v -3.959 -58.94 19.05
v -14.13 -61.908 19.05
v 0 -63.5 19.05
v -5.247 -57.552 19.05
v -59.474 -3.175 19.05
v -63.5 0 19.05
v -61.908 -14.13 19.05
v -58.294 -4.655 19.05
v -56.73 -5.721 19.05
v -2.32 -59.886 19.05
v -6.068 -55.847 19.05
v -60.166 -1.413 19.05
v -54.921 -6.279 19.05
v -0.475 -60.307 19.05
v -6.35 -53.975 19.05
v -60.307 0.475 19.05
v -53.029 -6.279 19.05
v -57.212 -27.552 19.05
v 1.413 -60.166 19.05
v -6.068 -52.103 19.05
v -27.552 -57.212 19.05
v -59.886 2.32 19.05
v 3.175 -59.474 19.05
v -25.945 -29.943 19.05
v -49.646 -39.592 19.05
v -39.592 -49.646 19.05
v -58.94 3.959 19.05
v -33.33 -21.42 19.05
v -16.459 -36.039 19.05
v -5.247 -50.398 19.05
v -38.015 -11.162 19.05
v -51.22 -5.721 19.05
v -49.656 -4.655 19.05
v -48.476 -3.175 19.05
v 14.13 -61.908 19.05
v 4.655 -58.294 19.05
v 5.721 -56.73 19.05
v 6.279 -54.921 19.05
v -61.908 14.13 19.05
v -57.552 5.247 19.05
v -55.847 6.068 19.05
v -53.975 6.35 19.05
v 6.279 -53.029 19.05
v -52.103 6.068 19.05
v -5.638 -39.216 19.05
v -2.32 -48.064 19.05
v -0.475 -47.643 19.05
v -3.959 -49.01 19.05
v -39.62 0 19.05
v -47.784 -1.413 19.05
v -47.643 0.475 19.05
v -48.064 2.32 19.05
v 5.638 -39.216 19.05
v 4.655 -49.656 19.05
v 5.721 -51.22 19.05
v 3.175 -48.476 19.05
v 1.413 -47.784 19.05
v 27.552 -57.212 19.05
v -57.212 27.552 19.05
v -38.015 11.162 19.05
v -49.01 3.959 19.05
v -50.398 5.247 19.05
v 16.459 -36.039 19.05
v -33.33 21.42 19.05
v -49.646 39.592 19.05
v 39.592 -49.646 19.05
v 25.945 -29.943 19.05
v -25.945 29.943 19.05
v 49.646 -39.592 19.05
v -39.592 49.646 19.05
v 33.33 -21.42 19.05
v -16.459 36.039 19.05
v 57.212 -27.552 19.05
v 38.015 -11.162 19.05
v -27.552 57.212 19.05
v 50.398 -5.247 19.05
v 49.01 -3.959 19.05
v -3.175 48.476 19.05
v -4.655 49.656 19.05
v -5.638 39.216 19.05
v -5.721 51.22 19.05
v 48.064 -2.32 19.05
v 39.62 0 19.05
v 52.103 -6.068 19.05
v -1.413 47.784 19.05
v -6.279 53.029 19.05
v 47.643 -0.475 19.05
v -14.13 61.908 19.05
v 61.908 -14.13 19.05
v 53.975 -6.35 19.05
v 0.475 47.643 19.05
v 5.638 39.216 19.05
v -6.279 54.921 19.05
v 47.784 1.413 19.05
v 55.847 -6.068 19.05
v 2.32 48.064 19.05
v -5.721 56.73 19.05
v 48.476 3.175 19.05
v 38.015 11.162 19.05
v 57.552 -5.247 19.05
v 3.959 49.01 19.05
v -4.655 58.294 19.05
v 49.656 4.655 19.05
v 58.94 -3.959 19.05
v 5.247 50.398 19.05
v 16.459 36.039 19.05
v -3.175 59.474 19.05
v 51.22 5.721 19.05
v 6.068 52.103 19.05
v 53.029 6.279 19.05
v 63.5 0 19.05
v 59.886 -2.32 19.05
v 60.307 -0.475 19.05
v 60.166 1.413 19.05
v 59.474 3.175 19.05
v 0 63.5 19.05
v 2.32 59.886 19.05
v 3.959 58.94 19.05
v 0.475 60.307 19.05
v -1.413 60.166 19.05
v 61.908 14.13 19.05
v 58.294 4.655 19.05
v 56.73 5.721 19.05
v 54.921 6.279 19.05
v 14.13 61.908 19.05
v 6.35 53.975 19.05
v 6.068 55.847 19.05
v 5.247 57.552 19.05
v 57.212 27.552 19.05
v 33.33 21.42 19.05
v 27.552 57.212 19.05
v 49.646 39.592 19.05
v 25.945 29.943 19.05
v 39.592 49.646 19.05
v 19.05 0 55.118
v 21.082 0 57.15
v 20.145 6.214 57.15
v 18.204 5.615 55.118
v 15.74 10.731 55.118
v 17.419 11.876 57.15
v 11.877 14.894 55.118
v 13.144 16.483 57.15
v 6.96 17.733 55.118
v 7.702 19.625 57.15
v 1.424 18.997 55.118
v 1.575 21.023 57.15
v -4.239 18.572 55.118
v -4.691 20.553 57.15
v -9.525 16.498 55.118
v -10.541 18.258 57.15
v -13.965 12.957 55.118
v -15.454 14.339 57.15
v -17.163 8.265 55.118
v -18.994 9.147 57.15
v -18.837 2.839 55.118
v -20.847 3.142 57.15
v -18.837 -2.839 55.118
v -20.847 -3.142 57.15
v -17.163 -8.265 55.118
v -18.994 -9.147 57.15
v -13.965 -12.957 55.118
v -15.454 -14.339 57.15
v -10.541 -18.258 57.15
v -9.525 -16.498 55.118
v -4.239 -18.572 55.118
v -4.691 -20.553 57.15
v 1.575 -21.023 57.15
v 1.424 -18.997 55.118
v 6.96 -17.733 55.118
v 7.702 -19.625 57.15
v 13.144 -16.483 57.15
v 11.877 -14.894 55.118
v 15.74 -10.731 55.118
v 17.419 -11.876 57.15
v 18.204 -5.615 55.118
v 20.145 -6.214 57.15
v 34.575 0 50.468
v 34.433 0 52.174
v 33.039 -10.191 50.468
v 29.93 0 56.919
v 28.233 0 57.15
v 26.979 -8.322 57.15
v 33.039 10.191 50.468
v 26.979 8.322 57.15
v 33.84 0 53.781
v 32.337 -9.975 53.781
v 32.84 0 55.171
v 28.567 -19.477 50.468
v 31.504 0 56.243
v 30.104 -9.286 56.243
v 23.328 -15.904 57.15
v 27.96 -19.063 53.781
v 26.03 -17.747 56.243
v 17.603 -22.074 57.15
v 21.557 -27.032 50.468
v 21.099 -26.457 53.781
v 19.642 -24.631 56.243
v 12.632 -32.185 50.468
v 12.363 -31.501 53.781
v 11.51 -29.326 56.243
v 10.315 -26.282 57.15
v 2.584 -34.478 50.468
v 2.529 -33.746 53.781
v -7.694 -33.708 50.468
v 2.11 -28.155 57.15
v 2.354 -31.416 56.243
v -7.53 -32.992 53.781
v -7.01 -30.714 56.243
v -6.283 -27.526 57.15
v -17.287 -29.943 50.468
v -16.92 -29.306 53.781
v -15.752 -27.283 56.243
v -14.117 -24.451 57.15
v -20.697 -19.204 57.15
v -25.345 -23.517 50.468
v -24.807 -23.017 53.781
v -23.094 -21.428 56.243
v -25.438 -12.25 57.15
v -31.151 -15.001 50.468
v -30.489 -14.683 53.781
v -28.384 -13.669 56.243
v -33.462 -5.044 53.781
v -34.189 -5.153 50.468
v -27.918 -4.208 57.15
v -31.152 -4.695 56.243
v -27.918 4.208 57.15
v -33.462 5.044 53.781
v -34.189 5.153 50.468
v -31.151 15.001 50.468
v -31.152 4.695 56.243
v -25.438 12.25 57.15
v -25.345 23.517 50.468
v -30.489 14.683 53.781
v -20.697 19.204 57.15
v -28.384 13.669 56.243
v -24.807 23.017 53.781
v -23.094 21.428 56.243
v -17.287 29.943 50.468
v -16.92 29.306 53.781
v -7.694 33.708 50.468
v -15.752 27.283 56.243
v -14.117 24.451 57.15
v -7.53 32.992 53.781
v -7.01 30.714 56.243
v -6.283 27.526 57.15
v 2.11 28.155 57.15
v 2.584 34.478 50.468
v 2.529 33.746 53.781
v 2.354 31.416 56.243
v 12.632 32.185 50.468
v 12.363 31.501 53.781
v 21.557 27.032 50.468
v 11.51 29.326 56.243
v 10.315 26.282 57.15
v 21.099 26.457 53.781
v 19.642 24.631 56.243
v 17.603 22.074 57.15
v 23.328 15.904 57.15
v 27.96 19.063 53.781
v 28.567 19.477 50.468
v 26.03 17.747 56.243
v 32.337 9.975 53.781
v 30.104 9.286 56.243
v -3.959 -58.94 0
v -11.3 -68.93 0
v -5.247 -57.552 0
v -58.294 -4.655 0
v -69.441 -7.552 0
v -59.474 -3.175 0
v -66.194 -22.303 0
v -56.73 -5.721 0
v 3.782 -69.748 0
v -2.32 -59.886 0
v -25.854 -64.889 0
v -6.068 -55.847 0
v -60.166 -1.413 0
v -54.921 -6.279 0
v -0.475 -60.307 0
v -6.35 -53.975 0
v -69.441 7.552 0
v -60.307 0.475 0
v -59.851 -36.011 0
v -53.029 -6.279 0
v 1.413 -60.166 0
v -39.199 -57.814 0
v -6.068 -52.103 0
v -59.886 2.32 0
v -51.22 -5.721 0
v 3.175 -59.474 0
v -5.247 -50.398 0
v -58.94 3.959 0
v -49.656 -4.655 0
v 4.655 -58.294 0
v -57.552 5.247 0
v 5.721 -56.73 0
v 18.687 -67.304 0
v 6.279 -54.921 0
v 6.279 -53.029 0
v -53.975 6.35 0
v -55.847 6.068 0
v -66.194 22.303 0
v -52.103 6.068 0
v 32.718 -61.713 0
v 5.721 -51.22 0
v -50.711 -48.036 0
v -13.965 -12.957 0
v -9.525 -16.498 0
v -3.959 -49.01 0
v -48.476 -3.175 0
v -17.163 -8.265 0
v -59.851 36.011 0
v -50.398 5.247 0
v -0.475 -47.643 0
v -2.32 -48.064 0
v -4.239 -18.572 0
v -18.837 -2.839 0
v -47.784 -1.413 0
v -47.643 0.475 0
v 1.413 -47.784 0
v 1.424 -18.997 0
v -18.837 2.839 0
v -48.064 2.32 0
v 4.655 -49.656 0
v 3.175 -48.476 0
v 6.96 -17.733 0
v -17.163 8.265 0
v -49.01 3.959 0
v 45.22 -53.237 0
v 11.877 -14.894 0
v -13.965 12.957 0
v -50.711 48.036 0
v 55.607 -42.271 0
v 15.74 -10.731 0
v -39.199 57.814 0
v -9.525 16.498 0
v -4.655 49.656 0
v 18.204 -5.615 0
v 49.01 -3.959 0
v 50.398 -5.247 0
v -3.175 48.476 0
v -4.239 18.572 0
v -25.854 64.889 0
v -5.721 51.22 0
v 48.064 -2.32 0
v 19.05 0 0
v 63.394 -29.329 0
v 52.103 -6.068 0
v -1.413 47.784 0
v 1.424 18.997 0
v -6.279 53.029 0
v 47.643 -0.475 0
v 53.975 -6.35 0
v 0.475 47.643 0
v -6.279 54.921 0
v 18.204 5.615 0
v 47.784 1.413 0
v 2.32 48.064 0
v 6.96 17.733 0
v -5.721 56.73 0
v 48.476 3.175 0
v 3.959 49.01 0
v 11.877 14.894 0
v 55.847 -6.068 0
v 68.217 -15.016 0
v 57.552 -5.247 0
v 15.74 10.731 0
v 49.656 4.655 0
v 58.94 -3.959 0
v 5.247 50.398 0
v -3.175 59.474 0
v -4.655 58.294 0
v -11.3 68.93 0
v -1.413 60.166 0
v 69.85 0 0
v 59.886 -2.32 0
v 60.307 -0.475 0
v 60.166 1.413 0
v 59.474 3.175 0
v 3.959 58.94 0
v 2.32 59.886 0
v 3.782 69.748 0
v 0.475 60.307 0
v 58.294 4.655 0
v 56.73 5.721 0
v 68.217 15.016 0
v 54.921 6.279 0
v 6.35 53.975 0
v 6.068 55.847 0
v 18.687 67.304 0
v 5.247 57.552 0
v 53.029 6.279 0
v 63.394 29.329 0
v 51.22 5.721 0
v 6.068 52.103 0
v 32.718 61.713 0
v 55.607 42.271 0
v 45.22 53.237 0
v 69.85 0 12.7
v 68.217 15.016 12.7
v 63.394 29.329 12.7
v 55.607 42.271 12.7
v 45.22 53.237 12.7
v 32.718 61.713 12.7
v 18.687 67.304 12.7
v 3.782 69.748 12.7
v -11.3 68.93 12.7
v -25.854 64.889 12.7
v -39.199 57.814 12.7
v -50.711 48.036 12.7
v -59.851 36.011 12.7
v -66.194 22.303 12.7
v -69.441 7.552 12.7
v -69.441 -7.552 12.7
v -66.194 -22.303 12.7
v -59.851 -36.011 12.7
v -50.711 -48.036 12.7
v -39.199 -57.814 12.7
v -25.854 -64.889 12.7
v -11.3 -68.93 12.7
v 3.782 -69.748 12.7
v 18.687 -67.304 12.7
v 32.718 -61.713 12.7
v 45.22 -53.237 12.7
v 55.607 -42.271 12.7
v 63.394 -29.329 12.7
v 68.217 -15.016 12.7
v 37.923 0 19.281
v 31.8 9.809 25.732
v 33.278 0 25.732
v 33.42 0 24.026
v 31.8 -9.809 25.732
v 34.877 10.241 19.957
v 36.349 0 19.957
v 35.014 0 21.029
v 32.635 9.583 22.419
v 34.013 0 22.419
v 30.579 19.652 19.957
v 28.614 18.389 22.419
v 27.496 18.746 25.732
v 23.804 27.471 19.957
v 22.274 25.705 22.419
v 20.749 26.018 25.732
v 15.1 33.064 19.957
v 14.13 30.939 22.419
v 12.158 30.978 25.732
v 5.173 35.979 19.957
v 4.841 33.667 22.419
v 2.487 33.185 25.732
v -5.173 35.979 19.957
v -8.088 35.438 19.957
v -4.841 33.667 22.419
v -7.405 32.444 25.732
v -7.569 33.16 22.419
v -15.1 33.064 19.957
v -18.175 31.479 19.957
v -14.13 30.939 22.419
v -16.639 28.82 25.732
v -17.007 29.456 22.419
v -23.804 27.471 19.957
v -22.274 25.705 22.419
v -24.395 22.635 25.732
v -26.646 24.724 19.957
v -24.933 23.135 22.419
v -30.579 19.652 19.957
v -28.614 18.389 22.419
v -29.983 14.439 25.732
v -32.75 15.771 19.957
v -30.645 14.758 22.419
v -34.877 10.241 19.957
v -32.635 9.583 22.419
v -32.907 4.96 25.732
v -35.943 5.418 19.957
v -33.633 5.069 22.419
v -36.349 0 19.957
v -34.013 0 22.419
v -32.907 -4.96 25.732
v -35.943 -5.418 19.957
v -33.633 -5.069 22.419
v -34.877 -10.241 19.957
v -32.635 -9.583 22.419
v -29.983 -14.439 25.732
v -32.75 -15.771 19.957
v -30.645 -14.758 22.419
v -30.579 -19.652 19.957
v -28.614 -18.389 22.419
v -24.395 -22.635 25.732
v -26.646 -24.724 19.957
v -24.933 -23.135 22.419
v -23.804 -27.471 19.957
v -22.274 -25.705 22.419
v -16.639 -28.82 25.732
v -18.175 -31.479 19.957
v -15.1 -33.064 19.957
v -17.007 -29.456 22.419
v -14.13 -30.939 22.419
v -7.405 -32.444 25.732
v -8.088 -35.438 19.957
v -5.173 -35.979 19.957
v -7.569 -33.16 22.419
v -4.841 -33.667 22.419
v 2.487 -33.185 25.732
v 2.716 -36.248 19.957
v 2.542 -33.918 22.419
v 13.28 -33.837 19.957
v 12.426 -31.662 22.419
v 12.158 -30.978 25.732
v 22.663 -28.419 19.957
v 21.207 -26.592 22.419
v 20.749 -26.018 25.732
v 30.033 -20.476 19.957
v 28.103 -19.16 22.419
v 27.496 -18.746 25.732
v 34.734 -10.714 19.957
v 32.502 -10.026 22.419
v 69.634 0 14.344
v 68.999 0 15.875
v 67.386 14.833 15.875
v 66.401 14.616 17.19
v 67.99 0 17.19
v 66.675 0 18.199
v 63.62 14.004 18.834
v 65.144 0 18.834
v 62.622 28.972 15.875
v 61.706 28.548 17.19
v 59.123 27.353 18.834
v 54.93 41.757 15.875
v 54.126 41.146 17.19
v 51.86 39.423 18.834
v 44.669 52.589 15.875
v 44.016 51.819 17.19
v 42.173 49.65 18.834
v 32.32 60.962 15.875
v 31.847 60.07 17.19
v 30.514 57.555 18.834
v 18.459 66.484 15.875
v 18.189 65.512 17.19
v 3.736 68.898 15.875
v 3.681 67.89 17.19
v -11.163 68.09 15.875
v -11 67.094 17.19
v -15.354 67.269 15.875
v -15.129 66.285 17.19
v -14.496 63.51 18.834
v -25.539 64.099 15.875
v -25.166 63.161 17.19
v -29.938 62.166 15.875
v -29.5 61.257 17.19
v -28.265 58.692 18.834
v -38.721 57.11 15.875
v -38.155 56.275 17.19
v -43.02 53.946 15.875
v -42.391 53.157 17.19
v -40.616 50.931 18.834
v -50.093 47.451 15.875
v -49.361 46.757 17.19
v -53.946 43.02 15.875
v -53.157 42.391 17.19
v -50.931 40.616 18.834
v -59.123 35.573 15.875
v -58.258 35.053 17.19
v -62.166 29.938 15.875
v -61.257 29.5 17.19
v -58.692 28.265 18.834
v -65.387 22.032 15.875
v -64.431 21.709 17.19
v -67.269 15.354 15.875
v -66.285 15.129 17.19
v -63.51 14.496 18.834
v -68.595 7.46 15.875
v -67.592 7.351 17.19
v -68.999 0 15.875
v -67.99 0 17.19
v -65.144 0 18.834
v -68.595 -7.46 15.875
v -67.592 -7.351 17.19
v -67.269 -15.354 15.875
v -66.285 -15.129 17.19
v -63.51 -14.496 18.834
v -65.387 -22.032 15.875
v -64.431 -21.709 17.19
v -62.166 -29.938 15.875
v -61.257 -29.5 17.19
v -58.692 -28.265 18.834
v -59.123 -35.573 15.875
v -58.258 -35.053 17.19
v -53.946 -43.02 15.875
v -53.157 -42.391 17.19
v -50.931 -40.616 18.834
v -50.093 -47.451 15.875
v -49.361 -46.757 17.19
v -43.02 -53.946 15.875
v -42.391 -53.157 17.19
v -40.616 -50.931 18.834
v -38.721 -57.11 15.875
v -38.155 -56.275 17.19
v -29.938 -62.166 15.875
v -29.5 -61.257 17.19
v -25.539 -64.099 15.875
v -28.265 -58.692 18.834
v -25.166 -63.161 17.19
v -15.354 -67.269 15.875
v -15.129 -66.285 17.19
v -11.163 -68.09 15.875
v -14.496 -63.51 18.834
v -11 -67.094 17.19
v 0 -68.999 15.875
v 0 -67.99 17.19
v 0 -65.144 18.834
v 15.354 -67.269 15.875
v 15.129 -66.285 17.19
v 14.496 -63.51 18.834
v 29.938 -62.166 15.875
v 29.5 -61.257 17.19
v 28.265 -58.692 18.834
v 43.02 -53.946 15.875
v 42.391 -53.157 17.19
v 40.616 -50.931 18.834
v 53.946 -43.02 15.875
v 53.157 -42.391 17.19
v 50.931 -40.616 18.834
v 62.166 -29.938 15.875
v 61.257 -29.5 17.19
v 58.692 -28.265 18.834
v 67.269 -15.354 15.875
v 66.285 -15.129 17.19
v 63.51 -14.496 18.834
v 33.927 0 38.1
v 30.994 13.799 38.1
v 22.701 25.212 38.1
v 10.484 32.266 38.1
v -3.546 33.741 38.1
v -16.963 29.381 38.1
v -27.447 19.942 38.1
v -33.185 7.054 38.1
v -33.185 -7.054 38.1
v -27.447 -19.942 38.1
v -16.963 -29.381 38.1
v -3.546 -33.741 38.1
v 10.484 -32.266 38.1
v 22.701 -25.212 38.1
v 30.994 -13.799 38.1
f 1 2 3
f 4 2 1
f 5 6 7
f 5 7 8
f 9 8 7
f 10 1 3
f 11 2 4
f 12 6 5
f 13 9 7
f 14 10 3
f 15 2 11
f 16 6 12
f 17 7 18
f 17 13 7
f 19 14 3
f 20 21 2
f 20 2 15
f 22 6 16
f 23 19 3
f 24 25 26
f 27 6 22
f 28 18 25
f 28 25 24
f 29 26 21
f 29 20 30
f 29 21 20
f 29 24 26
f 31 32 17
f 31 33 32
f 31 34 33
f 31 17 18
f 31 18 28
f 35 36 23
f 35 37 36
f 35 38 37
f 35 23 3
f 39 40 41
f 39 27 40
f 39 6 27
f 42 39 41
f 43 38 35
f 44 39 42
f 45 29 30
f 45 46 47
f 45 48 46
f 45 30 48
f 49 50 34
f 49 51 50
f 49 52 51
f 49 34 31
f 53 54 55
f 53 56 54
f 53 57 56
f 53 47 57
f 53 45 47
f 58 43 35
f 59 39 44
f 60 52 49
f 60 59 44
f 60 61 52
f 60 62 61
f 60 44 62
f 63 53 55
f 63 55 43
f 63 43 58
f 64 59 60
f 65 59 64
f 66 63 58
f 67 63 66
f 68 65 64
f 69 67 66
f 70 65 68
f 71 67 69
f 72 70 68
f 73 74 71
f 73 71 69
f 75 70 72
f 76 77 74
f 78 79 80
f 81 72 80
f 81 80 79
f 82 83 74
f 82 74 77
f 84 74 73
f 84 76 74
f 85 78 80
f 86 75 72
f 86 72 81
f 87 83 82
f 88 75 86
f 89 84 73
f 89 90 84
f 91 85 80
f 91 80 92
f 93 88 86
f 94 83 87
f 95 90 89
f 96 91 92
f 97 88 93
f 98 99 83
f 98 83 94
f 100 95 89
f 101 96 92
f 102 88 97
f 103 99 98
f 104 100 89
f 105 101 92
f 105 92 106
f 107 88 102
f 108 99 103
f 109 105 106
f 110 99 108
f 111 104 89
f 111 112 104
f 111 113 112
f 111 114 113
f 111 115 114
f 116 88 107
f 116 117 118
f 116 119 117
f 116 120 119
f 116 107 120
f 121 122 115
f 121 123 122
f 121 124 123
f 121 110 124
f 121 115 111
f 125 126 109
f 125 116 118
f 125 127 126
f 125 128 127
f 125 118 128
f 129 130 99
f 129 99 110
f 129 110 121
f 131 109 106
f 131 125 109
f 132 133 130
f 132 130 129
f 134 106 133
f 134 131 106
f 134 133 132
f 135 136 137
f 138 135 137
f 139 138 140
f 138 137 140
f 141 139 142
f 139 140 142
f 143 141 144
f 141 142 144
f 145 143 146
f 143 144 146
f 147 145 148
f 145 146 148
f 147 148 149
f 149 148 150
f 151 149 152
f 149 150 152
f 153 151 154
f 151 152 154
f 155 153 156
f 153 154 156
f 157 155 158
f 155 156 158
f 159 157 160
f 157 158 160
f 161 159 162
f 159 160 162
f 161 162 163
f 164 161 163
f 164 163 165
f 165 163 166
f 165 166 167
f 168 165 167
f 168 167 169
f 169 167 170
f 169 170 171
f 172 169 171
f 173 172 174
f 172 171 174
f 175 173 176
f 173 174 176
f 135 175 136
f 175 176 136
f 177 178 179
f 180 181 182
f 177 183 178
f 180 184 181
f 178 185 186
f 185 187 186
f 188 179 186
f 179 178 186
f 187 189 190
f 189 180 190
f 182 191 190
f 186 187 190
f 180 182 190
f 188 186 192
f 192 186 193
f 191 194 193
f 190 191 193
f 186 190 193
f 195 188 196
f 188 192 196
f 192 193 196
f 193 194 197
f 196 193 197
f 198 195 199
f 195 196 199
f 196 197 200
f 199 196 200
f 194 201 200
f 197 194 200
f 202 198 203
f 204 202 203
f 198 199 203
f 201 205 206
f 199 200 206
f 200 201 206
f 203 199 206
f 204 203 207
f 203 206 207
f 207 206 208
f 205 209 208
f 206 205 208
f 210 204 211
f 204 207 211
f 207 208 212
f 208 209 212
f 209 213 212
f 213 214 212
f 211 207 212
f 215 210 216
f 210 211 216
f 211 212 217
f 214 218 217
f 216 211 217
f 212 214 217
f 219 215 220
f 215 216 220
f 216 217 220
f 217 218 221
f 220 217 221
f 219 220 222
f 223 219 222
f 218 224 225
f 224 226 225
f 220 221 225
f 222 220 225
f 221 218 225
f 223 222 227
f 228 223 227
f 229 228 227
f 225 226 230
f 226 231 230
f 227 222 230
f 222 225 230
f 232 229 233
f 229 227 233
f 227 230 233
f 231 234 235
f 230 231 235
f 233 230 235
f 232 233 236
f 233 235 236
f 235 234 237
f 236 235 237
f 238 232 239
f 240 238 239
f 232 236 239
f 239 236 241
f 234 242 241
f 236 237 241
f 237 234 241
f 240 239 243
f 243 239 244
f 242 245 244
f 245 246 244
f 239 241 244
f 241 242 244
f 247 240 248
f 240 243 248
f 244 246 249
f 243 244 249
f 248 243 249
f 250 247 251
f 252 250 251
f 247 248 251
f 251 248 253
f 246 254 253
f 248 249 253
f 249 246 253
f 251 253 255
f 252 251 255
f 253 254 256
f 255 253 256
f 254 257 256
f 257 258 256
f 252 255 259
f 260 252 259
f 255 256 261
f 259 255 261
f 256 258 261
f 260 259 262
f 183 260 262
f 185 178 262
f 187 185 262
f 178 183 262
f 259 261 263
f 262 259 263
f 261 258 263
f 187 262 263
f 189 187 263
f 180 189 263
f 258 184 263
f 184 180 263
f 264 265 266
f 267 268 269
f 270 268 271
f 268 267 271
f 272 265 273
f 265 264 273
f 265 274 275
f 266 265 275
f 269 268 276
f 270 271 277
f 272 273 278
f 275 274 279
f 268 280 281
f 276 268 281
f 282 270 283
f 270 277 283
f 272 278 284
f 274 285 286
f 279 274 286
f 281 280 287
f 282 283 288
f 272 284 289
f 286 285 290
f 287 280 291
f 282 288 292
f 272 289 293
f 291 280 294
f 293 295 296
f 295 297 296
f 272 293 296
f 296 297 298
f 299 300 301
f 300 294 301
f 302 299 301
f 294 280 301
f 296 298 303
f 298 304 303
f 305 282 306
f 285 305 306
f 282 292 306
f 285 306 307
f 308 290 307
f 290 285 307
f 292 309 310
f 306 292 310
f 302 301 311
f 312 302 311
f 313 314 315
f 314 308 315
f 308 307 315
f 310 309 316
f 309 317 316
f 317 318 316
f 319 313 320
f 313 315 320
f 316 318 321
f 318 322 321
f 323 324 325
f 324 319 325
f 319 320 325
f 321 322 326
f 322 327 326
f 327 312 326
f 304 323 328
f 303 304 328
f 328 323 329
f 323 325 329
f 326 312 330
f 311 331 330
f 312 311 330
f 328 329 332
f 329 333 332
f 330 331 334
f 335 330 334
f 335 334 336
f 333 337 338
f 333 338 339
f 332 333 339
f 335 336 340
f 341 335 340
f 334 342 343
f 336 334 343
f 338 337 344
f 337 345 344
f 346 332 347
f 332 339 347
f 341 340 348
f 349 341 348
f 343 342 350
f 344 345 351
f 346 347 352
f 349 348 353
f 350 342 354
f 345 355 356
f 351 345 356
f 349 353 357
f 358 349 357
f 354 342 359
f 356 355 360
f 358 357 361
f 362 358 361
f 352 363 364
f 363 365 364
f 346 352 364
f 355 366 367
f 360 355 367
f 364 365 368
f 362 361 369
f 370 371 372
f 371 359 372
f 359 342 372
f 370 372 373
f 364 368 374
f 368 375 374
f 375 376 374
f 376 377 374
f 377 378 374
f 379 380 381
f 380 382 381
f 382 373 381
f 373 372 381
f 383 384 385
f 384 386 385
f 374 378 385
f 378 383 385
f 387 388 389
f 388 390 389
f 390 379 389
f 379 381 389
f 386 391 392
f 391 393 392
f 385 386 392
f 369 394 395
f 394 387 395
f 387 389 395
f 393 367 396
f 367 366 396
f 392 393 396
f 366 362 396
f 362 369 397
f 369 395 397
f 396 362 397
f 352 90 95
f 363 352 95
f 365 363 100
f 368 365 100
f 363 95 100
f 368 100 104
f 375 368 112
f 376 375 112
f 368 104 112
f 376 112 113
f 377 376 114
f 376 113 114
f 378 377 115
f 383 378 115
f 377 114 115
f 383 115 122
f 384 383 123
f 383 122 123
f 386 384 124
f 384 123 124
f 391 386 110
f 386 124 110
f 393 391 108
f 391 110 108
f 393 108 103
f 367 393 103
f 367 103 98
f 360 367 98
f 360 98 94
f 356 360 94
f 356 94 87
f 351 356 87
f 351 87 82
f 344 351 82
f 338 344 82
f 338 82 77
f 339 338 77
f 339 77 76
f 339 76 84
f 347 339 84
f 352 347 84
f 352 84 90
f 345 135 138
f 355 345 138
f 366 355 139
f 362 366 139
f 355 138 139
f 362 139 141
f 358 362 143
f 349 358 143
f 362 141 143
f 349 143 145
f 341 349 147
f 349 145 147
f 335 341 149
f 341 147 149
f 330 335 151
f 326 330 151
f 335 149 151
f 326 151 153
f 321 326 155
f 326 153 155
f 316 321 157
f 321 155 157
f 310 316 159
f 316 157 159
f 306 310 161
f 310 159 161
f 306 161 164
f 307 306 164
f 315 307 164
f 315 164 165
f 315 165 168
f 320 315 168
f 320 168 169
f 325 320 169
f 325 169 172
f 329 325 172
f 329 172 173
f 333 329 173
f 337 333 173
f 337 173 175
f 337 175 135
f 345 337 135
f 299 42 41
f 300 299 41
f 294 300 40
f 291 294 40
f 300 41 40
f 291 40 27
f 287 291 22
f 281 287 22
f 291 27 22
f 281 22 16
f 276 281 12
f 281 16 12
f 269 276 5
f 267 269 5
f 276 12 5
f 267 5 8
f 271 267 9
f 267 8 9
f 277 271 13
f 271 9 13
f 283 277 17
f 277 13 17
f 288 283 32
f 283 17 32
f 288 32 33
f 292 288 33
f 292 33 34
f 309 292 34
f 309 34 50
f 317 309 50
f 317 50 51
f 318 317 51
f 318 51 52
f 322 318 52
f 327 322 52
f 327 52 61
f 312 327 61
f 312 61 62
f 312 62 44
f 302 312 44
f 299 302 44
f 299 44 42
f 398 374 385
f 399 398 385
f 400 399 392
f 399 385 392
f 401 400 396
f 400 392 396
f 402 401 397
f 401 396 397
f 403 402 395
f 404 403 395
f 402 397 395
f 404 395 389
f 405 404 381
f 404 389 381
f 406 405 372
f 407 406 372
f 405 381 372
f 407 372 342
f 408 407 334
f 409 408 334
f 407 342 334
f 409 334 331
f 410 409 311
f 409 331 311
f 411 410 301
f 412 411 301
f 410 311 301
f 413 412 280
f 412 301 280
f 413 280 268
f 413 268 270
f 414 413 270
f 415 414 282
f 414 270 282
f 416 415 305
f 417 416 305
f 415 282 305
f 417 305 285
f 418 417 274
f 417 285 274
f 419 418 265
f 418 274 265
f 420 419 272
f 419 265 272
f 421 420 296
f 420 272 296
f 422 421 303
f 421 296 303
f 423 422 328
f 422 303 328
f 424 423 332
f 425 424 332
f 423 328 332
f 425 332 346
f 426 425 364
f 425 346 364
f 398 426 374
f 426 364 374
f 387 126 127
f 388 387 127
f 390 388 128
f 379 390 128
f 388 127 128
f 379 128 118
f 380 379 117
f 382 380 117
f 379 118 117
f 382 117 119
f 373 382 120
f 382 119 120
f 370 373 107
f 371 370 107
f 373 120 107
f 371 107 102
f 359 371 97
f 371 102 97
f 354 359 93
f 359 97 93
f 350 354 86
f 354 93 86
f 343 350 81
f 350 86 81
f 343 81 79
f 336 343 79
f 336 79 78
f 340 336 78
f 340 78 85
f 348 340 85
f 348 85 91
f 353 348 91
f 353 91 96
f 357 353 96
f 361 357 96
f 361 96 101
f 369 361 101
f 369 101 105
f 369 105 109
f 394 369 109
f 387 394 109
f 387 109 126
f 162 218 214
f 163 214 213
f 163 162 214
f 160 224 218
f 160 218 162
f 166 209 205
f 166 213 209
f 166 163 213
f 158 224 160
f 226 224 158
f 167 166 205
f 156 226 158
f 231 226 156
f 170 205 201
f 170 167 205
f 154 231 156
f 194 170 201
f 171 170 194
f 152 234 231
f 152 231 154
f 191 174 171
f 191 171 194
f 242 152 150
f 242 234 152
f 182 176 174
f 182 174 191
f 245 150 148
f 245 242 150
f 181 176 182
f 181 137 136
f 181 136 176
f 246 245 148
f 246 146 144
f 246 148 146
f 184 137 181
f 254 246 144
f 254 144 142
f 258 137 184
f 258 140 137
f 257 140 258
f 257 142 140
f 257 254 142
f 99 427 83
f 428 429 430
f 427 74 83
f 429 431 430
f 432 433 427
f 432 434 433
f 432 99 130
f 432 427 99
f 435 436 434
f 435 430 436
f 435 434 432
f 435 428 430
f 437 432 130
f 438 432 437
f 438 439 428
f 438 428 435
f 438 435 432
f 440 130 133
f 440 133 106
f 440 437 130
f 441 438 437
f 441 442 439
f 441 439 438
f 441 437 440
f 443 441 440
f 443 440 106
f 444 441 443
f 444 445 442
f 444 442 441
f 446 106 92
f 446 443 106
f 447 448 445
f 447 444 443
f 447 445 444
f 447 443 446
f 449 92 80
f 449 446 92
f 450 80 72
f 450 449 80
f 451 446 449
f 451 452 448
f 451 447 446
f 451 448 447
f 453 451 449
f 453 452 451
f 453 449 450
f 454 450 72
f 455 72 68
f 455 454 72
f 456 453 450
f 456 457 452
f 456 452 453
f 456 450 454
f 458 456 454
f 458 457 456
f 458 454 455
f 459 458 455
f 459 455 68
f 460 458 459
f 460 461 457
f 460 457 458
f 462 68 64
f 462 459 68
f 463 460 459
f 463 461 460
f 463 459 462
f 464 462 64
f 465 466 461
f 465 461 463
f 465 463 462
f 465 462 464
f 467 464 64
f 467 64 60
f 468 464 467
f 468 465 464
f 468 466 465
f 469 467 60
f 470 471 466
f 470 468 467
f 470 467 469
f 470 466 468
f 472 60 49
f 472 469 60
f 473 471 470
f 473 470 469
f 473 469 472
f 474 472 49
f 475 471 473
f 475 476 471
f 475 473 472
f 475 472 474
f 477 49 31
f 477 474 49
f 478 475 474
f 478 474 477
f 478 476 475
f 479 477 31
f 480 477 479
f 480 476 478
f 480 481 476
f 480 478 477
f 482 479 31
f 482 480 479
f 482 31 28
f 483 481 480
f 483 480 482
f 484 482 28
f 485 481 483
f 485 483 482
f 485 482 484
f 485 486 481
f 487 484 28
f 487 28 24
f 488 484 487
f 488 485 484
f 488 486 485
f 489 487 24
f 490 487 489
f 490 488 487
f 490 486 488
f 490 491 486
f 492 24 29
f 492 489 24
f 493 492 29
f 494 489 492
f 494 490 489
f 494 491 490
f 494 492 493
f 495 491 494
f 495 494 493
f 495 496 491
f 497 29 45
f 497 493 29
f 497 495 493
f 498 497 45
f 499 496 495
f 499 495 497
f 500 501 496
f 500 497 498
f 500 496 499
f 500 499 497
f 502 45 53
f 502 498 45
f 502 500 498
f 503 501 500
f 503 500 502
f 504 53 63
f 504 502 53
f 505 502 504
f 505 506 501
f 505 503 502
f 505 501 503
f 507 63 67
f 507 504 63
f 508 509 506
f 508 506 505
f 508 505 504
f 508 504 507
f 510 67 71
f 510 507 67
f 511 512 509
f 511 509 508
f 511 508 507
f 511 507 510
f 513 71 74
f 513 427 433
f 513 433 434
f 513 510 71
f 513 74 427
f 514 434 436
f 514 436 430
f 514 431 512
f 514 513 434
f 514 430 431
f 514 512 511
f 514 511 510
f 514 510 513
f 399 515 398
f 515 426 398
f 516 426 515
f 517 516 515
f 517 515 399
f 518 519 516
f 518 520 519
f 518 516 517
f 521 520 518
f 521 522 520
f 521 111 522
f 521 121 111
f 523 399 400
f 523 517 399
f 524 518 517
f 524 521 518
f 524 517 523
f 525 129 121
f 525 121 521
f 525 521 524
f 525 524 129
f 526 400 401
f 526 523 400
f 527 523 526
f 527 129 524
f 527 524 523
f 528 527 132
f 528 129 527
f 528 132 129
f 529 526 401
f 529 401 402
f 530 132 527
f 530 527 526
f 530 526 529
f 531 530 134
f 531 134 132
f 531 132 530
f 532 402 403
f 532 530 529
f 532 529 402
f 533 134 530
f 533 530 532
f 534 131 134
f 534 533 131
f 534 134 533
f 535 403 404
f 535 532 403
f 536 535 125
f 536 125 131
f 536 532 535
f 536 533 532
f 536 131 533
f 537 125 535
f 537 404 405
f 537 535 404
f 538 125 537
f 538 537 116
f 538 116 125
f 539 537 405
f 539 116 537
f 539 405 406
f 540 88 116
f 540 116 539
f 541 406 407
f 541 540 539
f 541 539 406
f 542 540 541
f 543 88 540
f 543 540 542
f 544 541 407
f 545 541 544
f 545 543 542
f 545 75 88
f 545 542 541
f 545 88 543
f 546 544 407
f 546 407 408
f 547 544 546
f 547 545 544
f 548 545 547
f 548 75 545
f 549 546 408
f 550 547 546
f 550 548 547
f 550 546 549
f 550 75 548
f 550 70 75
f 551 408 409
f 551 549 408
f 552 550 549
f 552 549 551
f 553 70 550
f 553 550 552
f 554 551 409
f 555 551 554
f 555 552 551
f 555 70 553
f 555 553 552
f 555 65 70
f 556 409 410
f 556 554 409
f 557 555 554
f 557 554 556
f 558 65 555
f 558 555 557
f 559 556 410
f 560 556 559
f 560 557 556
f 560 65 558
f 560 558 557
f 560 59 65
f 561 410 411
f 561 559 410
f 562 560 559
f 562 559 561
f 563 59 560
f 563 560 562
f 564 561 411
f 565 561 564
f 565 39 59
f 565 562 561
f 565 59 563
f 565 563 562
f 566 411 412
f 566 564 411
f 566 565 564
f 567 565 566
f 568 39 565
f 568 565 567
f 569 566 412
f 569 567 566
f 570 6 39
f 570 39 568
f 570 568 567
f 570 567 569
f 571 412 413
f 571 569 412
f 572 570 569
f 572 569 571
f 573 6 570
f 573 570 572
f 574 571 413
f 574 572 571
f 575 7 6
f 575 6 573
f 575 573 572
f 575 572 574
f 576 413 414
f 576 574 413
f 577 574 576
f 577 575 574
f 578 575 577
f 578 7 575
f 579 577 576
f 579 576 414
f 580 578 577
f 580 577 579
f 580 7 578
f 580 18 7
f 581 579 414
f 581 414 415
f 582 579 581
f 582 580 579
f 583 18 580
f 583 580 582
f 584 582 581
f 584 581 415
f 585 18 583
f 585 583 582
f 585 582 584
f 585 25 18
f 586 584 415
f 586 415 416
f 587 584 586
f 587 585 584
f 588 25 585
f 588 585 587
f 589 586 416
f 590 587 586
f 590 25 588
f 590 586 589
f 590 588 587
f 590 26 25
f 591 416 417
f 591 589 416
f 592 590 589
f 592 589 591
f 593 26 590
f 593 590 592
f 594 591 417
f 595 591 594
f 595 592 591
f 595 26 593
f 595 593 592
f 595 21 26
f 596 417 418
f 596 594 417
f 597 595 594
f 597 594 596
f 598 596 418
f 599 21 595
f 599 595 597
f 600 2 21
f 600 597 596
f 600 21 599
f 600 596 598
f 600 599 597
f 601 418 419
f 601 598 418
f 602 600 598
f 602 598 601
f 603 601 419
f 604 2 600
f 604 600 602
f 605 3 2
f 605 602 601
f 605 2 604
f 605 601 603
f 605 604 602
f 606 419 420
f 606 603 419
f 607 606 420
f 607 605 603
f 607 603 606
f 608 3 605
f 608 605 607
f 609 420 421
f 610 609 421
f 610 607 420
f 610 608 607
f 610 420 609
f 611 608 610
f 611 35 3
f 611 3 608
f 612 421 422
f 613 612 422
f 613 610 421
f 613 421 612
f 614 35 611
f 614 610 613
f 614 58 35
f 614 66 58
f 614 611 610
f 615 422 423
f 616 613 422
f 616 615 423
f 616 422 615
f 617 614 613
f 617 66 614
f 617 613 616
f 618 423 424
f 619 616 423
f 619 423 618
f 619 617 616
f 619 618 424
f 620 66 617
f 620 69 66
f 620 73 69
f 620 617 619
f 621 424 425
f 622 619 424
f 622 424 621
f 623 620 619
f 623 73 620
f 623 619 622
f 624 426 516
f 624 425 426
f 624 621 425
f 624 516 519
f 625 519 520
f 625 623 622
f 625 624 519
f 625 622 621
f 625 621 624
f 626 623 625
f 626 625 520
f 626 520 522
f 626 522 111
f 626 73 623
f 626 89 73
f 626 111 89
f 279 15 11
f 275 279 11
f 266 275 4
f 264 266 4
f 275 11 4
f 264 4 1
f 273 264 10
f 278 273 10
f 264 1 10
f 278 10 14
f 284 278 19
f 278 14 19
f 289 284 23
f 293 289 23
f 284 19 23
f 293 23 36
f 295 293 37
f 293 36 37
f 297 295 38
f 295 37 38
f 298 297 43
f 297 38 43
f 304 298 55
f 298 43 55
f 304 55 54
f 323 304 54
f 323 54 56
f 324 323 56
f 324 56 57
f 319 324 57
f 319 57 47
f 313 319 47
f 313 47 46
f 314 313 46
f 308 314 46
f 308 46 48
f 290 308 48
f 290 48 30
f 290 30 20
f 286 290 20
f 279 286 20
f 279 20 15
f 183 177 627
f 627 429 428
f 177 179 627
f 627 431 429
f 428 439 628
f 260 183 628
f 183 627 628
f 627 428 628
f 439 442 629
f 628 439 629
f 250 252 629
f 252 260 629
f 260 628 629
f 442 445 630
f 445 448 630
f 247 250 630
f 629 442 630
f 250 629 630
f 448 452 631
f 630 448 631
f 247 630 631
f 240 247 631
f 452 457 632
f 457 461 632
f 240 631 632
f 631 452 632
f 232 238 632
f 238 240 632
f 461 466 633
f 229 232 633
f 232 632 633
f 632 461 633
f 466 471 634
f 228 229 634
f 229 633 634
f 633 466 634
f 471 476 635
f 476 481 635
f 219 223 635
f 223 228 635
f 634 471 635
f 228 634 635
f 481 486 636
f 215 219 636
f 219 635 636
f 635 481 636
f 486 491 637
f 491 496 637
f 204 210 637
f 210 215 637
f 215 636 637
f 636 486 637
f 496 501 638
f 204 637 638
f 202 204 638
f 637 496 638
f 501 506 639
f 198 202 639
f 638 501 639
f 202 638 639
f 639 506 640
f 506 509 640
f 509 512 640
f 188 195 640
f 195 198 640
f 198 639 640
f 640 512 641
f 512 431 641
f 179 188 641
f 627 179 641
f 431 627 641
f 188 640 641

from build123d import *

# Parameters (mm, degrees)
SKETCH1_R           = 69.85
BOSS_EXTRUDE1_DEPTH = 19.05
SKETCH3_R           = 34.925
BOSS_EXTRUDE2_DEPTH = 38.1
BOSS_EXTRUDE2_TAPER = 3
SKETCH4_R           = 19.05
CUT_EXTRUDE1_DEPTH  = 20.05
SKETCH5_R           = 19.05
BOLT_HOLE_DEPTH     = 58.15
SKETCH6_R           = 6.35
CUT_EXTRUDE3_DEPTH  = 20.05
CIRPATTERN2_COUNT   = 4
FILLET1_R           = 6.35
CHAMFER1_SIZE       = 2.032


with BuildPart() as part:
    # Sketch1 → Boss-Extrude1 (new body)
    with BuildSketch(Plane.XY):
        Circle(SKETCH1_R)
    extrude(amount=BOSS_EXTRUDE1_DEPTH)

    # Sketch3 → Boss-Extrude2 (add)
    with BuildSketch(Plane.XY.offset(57.15)):
        Circle(SKETCH3_R)
    extrude(amount=-BOSS_EXTRUDE2_DEPTH, taper=BOSS_EXTRUDE2_TAPER)

    # Sketch4 → Cut-Extrude1 (cut, through all)
    with BuildSketch(Plane.XY.offset(19.05)):
        Circle(SKETCH4_R)
    extrude(amount=-CUT_EXTRUDE1_DEPTH, mode=Mode.SUBTRACT)

    # Sketch5 → Bolt Hole (cut, through all)
    with BuildSketch(Plane.XY.offset(57.15)):
        Circle(SKETCH5_R)
    extrude(amount=-BOLT_HOLE_DEPTH, mode=Mode.SUBTRACT)

    # Sketch6 → Cut-Extrude3 (cut, through all)
    with BuildSketch(Plane.XY.offset(19.05)):
        with Locations((0, 53.975)):
            Circle(SKETCH6_R)
    cut_extrude3 = extrude(amount=-CUT_EXTRUDE3_DEPTH, mode=Mode.SUBTRACT)

    # CirPattern2: Cut-Extrude3 ×4 about axis
    cirpattern2_axis = Axis((0, 0, 0), (0, 0, 1))
    for i in range(1, CIRPATTERN2_COUNT):
        add(cut_extrude3.rotate(cirpattern2_axis, i * 360 / CIRPATTERN2_COUNT), mode=Mode.SUBTRACT)

    # Fillet1
    fillet1_edges = [part.edges().sort_by_distance(p)[0] for p in [
        (-69.85, 0, 19.05),
        (-34.925, 0, 57.15),
        (-32.928263609, 0, 19.05),
    ]]
    fillet(fillet1_edges, radius=FILLET1_R)

    # Chamfer1
    chamfer1_edges = [part.edges().sort_by_distance(p)[0] for p in [
        (-19.05, 0, 57.15),
    ]]
    chamfer(chamfer1_edges, length=CHAMFER1_SIZE)


solid = part.part
